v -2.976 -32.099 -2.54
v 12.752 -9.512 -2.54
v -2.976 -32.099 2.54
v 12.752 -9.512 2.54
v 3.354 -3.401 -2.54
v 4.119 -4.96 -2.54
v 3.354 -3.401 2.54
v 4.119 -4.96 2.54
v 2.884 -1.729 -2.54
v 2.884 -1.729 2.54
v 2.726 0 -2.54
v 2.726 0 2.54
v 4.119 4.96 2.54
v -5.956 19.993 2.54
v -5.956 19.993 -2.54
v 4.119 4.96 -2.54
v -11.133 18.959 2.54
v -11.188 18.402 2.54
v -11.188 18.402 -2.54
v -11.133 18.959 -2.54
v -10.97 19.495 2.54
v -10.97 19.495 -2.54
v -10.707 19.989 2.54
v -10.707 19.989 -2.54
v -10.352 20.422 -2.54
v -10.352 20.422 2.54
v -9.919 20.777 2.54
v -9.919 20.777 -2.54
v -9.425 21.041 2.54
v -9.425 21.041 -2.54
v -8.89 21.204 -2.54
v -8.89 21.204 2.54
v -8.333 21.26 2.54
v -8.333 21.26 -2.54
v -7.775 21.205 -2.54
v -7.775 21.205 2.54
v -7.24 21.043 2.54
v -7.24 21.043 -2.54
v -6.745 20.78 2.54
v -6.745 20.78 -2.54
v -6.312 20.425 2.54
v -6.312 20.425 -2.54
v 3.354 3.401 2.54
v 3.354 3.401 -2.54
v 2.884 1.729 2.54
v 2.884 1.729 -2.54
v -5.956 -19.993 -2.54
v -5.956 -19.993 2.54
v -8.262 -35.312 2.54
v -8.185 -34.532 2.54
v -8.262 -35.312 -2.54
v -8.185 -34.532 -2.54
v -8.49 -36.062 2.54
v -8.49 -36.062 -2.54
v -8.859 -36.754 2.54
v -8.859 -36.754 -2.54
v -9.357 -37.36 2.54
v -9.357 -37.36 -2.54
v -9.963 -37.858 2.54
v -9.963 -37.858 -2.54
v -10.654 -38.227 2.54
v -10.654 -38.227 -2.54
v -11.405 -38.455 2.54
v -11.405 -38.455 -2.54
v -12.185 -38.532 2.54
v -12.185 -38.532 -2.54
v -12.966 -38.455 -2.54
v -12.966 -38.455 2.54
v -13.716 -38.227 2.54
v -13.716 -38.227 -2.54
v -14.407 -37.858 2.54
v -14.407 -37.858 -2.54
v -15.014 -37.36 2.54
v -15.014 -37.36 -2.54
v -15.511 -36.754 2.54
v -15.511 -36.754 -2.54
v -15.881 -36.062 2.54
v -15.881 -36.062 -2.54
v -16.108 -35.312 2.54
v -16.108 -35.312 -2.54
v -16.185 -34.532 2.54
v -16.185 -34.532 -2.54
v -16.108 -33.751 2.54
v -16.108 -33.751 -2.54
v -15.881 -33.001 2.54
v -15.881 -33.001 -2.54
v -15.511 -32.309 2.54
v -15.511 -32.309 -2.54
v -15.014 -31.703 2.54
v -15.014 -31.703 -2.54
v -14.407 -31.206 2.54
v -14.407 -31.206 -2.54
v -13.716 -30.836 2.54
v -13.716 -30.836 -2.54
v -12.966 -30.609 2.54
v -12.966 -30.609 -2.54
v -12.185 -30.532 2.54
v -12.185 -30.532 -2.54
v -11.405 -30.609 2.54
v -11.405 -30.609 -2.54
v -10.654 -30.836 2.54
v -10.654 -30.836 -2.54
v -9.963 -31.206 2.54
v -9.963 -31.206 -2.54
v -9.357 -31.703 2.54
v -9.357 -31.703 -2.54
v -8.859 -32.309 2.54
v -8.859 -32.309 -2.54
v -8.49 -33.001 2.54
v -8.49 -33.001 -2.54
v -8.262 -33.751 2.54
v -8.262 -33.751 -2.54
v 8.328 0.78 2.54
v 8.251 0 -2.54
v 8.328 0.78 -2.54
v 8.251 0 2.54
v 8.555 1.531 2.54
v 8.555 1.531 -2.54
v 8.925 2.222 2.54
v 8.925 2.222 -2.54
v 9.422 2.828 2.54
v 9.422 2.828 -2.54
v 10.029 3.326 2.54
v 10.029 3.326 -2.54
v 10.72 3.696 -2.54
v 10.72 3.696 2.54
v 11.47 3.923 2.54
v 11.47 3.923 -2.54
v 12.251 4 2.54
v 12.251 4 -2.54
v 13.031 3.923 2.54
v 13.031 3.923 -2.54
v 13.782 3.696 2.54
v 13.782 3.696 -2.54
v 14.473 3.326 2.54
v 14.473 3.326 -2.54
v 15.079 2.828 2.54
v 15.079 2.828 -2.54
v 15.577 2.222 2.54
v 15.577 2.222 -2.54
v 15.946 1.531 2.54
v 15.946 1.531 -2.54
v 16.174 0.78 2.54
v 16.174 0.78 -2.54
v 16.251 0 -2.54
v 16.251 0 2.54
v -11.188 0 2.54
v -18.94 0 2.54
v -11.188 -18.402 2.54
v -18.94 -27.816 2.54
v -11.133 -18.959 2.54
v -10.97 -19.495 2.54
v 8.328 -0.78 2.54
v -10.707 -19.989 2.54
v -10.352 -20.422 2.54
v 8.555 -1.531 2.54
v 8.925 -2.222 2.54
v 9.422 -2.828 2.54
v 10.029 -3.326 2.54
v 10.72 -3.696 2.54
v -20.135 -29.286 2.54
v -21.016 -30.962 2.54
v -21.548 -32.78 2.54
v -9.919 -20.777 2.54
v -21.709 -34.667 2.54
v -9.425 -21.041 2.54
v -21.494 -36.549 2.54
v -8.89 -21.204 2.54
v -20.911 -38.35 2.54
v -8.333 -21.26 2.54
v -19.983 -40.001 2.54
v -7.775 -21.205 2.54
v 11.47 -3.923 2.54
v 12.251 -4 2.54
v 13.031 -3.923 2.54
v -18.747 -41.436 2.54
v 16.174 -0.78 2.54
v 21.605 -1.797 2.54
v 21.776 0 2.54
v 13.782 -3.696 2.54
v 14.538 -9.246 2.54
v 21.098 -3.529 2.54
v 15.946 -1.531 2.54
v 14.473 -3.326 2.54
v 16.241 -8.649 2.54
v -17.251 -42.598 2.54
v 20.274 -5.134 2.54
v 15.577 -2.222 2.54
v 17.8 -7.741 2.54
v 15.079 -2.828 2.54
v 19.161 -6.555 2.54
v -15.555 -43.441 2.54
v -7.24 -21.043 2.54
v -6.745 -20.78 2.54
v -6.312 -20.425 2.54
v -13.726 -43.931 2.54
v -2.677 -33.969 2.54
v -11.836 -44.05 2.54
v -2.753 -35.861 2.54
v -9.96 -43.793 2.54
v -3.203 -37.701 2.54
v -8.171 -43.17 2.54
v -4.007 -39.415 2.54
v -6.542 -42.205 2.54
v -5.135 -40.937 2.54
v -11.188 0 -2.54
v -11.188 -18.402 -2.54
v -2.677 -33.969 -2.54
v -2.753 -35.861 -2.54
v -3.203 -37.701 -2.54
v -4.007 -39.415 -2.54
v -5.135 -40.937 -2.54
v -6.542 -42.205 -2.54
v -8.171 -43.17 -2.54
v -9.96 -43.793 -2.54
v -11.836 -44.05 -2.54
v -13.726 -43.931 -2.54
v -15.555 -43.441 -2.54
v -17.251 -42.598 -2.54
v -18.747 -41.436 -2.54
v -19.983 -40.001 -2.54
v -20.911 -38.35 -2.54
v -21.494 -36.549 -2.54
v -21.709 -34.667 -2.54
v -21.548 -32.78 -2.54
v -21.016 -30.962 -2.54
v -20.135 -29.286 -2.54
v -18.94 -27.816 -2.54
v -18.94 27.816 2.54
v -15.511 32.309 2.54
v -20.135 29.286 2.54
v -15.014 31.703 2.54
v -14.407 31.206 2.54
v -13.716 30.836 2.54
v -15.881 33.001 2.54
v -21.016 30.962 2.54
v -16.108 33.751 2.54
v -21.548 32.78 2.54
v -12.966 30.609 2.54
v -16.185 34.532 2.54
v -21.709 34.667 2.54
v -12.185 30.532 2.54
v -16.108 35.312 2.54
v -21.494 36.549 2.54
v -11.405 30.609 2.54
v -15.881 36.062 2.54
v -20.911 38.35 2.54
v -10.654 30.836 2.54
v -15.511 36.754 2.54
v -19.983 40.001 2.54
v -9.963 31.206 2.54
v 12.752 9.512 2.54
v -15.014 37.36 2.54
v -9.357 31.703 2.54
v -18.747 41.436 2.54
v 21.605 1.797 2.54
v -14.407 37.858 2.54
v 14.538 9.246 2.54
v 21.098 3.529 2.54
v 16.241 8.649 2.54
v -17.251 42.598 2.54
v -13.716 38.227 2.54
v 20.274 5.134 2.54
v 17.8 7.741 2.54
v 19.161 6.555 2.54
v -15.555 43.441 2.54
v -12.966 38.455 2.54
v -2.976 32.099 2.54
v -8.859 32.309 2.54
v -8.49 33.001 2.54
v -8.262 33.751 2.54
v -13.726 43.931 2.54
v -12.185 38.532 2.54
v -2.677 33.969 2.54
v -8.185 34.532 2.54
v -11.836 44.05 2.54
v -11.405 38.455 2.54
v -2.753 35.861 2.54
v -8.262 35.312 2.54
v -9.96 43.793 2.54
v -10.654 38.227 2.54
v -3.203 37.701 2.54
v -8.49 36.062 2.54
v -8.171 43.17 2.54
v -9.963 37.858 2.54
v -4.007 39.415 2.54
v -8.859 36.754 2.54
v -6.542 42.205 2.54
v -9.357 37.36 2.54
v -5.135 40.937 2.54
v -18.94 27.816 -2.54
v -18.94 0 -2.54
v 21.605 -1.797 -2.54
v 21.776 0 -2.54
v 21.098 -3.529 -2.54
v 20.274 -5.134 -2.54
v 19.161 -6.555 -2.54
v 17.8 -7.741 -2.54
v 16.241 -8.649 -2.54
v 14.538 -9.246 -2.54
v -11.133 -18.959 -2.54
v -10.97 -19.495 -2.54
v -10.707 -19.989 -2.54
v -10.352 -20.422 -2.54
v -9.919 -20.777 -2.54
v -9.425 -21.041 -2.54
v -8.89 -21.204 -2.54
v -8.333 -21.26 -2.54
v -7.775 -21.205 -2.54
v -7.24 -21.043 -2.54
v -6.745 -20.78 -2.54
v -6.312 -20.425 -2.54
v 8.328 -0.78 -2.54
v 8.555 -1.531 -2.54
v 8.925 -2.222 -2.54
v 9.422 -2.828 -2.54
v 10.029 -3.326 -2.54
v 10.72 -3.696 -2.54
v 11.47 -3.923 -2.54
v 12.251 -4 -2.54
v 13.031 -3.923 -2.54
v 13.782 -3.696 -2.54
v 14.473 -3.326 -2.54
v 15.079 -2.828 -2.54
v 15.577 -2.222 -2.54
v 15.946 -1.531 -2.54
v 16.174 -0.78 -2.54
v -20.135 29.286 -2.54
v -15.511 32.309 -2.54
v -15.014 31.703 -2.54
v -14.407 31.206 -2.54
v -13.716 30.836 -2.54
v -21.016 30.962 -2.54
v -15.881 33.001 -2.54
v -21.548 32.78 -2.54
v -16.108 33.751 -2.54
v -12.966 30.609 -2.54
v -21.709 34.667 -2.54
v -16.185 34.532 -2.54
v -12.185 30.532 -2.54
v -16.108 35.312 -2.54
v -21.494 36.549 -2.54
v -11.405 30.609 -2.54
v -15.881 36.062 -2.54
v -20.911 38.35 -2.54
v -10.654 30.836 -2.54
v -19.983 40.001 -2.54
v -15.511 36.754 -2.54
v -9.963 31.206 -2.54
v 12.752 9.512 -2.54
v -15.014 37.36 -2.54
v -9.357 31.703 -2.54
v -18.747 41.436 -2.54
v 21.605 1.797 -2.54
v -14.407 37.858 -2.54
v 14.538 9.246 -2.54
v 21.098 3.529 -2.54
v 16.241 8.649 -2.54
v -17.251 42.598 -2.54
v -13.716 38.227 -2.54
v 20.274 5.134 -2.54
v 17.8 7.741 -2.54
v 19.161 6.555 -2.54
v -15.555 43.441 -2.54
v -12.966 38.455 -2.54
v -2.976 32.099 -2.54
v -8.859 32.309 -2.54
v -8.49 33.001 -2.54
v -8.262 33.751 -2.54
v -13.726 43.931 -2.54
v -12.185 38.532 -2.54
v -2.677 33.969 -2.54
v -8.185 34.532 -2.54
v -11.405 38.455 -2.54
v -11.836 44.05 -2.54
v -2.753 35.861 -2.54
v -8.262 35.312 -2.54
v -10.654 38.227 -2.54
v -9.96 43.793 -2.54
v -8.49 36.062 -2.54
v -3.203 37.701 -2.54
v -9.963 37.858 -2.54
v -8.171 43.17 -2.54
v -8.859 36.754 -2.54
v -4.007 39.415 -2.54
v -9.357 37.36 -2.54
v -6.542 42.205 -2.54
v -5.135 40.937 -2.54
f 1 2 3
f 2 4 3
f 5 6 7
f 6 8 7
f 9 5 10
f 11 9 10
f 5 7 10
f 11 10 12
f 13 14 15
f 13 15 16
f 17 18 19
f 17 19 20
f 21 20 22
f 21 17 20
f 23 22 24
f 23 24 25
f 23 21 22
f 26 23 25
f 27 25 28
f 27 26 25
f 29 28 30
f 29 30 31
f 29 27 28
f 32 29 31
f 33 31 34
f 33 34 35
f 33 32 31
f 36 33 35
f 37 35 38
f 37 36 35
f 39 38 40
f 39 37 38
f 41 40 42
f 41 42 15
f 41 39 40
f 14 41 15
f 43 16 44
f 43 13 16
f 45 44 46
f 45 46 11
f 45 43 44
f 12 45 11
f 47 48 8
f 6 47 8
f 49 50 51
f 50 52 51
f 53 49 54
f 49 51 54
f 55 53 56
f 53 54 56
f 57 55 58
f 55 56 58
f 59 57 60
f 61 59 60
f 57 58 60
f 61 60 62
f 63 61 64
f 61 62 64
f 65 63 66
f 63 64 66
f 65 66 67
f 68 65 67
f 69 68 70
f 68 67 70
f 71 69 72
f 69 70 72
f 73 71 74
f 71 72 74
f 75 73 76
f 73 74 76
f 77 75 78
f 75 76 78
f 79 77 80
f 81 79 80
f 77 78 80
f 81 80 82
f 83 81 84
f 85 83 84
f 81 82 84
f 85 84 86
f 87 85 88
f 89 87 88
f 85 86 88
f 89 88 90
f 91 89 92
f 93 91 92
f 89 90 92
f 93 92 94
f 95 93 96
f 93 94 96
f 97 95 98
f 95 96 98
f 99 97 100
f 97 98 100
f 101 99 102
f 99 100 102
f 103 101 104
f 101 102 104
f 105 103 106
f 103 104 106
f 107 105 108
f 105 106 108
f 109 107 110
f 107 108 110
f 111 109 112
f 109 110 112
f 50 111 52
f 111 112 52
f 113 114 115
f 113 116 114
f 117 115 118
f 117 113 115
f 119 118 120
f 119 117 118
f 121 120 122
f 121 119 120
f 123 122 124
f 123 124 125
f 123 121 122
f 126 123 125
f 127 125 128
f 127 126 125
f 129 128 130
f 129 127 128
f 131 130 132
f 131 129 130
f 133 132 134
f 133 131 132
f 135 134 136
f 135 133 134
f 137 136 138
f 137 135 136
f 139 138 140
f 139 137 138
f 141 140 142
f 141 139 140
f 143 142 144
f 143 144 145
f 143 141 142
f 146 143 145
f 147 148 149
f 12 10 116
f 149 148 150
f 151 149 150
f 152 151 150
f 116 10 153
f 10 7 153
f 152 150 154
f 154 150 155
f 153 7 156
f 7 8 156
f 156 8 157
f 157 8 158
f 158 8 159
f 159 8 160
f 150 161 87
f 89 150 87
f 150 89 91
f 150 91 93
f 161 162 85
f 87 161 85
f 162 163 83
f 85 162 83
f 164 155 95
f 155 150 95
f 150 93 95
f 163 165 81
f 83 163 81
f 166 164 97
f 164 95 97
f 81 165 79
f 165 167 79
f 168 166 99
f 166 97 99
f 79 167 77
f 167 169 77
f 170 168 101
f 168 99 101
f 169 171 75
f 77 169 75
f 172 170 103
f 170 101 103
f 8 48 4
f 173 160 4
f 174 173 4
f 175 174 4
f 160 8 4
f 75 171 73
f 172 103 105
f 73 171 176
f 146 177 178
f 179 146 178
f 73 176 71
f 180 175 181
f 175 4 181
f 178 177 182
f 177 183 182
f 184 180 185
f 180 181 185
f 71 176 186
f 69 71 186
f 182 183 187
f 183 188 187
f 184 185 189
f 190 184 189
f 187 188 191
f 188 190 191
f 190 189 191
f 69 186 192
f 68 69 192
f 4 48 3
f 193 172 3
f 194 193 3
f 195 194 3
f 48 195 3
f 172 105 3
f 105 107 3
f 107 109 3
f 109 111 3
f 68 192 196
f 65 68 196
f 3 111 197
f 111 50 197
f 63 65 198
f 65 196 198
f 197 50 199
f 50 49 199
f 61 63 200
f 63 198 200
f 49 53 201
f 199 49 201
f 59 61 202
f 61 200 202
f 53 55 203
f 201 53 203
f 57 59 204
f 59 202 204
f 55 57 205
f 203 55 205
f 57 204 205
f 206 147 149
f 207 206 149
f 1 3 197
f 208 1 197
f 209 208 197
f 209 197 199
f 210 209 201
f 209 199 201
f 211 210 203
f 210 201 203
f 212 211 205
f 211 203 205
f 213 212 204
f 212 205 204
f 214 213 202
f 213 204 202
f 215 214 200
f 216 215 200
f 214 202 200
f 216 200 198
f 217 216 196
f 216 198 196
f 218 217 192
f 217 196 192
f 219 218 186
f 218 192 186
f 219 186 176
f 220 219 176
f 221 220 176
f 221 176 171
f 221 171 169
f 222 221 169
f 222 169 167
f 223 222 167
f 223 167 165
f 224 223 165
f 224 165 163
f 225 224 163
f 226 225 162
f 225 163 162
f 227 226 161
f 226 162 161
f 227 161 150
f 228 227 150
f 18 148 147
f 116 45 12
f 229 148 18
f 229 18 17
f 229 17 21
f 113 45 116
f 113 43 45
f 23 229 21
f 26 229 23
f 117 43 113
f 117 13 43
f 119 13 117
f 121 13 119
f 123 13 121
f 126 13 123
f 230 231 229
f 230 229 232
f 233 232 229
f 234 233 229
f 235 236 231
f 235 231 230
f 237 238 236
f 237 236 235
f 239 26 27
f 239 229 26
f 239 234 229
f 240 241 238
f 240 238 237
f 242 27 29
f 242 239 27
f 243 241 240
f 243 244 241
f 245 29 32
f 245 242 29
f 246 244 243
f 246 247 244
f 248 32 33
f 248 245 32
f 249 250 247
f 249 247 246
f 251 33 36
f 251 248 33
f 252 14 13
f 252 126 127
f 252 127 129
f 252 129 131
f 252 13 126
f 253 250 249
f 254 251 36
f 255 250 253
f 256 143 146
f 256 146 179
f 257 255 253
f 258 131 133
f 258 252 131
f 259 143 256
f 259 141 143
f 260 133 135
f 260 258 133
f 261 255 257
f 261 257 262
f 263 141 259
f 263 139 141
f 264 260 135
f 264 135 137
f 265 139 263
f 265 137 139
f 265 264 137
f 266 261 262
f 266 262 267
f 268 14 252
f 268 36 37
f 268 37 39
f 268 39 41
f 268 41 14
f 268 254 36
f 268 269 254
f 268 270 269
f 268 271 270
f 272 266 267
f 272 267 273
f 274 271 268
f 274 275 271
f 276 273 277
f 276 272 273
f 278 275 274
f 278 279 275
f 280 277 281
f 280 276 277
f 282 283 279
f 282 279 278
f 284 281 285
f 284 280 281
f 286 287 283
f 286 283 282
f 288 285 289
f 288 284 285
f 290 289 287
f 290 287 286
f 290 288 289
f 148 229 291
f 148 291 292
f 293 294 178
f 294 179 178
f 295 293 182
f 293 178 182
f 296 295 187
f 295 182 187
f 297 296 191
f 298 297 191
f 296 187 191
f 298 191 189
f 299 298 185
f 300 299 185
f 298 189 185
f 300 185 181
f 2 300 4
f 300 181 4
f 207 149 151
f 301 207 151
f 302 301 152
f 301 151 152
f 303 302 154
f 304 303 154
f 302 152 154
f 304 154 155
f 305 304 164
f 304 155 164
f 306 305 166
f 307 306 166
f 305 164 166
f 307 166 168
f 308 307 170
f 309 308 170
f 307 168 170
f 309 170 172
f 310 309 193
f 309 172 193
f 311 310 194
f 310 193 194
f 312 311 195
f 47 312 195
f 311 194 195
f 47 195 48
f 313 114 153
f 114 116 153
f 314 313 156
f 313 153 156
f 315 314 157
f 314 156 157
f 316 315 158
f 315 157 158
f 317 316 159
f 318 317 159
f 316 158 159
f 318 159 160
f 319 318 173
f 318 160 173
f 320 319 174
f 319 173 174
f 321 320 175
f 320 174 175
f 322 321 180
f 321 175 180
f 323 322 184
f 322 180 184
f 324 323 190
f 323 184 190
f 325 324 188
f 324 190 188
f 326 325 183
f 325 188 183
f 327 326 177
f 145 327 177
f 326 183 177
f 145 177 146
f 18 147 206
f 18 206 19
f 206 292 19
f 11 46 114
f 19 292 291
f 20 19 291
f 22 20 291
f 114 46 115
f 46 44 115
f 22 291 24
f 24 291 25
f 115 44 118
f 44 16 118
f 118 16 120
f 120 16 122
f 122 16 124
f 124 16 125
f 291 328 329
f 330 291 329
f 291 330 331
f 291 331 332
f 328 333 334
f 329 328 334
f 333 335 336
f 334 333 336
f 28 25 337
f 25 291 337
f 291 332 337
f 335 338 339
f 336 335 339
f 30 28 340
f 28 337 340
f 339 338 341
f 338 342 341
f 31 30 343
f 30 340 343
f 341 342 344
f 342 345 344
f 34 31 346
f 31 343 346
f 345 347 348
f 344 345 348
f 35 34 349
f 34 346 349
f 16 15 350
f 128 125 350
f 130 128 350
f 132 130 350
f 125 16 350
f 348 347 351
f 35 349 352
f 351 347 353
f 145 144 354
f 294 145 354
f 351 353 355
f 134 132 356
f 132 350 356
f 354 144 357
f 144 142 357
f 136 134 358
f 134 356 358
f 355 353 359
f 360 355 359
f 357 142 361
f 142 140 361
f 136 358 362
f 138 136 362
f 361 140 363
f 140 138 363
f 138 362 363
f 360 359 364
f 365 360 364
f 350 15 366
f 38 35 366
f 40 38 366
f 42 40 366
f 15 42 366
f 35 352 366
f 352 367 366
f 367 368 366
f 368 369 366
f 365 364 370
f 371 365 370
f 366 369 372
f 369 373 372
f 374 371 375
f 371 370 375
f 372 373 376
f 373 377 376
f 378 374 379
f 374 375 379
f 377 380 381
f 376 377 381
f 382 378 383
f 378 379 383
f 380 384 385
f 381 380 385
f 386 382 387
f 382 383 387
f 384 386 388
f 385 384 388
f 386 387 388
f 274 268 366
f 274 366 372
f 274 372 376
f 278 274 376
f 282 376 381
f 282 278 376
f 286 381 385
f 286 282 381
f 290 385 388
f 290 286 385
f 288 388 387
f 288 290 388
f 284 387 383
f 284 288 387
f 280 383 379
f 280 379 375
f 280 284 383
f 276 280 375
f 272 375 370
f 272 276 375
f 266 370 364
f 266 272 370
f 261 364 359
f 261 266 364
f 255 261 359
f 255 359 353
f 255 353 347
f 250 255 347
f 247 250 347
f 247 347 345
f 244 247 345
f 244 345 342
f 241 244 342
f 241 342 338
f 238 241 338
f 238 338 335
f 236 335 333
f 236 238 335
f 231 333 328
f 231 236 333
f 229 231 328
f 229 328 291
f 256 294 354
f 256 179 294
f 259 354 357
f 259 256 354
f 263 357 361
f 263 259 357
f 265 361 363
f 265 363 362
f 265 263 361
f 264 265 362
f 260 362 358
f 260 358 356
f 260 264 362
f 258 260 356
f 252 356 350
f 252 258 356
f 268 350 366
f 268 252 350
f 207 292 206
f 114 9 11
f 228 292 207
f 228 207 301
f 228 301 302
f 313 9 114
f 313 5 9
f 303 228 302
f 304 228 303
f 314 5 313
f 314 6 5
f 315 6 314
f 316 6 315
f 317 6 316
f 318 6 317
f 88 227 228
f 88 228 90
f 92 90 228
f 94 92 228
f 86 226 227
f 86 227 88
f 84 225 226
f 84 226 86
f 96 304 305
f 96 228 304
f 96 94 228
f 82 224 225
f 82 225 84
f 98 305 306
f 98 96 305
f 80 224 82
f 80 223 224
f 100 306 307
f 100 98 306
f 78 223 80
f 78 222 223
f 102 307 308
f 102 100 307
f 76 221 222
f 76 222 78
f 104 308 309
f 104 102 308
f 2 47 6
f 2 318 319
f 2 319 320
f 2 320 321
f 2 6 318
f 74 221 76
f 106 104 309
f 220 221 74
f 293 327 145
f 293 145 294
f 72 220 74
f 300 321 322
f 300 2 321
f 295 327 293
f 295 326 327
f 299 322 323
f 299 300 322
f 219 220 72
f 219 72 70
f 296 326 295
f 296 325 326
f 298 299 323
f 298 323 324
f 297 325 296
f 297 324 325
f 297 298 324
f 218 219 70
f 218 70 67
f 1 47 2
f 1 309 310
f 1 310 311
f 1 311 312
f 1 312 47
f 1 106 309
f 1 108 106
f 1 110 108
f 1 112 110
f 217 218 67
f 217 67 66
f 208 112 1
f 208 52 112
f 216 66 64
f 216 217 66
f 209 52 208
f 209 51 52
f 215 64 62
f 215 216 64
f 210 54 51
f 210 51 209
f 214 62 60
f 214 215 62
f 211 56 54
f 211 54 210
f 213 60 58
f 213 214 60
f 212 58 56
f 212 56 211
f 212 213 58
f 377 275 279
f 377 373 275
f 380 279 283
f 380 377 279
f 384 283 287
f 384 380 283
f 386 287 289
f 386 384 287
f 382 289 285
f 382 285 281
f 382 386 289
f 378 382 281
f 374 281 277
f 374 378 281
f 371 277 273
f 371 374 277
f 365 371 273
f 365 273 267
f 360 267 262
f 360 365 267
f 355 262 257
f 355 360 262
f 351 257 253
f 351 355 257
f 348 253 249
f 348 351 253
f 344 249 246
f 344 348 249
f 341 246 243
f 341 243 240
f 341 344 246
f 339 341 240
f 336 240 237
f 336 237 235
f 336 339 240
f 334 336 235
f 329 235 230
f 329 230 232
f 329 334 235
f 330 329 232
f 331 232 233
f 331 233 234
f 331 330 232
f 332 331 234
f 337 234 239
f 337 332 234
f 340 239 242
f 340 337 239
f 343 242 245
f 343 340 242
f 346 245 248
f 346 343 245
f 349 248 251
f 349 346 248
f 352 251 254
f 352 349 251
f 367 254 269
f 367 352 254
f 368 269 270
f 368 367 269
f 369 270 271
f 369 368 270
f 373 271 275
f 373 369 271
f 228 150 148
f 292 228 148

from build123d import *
from build123d import SkipClean  # not in build123d's __all__

# Parameters (mm, degrees)
F0_R     = 4
F1_DEPTH = 2.54


with BuildPart() as f1:
    # F0 (on Top) → F1 (new body, symmetric)
    with BuildSketch(Plane.XY):
        with BuildLine():
            Line((12.7523779158, 9.5117846914), (-2.9762470444, 32.0985170452))
            ThreePointArc((-2.9762470444, 32.0985170452), (-14.6529201579, 43.7315272534), (-18.9402122051, 27.8164165593))
            Line((-18.9402122051, 27.8164165593), (-18.9402122051, 0))
            Line((-18.9402122051, 0), (-11.187657958, 0))
            Line((-11.187657958, 0), (-11.187657958, 18.4020288289))
            ThreePointArc((-11.187657958, 18.4020288289), (-9.1615879854, 21.1358961189), (-5.9564906022, 19.9929435136))
            Line((-5.9564906022, 19.9929435136), (4.1191245614, 4.9599822668))
            ThreePointArc((4.1191245614, 4.9599822668), (3.0807470851, 2.5759836915), (2.725803411, 0))
            Line((2.725803411, 0), (8.250803411, 0))
            ThreePointArc((8.250803411, 0), (12.250803411, 4), (16.250803411, 0))
            Line((16.250803411, 0), (21.775803411, 0))
            ThreePointArc((21.775803411, 0), (19.1610538463, 6.5554606185), (12.7523779158, 9.5117846914))
        make_face()
        with Locations((-12.1852122247, 34.5317423344)):
            Circle(F0_R, mode=Mode.SUBTRACT)
    extrude(amount=F1_DEPTH, both=True)

    # F2: F1 across plane


with BuildPart() as f1_1:
    add(f1.part, clean=False)
    with SkipClean():  # cleaning this boolean's faces spoils the solid; the shape is the same uncleaned
        add(f1.part.mirror(Plane.XZ), clean=False)


solid = f1_1.part
